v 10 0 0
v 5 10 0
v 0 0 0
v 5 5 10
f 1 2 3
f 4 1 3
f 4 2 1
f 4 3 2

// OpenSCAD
// Construct: polyhedron() — an explicit tetrahedron from points + faces.
polyhedron(
    points = [[0, 0, 0], [10, 0, 0], [5, 10, 0], [5, 5, 10]],
    faces  = [[0, 2, 1], [0, 1, 3], [1, 2, 3], [2, 0, 3]]
);
